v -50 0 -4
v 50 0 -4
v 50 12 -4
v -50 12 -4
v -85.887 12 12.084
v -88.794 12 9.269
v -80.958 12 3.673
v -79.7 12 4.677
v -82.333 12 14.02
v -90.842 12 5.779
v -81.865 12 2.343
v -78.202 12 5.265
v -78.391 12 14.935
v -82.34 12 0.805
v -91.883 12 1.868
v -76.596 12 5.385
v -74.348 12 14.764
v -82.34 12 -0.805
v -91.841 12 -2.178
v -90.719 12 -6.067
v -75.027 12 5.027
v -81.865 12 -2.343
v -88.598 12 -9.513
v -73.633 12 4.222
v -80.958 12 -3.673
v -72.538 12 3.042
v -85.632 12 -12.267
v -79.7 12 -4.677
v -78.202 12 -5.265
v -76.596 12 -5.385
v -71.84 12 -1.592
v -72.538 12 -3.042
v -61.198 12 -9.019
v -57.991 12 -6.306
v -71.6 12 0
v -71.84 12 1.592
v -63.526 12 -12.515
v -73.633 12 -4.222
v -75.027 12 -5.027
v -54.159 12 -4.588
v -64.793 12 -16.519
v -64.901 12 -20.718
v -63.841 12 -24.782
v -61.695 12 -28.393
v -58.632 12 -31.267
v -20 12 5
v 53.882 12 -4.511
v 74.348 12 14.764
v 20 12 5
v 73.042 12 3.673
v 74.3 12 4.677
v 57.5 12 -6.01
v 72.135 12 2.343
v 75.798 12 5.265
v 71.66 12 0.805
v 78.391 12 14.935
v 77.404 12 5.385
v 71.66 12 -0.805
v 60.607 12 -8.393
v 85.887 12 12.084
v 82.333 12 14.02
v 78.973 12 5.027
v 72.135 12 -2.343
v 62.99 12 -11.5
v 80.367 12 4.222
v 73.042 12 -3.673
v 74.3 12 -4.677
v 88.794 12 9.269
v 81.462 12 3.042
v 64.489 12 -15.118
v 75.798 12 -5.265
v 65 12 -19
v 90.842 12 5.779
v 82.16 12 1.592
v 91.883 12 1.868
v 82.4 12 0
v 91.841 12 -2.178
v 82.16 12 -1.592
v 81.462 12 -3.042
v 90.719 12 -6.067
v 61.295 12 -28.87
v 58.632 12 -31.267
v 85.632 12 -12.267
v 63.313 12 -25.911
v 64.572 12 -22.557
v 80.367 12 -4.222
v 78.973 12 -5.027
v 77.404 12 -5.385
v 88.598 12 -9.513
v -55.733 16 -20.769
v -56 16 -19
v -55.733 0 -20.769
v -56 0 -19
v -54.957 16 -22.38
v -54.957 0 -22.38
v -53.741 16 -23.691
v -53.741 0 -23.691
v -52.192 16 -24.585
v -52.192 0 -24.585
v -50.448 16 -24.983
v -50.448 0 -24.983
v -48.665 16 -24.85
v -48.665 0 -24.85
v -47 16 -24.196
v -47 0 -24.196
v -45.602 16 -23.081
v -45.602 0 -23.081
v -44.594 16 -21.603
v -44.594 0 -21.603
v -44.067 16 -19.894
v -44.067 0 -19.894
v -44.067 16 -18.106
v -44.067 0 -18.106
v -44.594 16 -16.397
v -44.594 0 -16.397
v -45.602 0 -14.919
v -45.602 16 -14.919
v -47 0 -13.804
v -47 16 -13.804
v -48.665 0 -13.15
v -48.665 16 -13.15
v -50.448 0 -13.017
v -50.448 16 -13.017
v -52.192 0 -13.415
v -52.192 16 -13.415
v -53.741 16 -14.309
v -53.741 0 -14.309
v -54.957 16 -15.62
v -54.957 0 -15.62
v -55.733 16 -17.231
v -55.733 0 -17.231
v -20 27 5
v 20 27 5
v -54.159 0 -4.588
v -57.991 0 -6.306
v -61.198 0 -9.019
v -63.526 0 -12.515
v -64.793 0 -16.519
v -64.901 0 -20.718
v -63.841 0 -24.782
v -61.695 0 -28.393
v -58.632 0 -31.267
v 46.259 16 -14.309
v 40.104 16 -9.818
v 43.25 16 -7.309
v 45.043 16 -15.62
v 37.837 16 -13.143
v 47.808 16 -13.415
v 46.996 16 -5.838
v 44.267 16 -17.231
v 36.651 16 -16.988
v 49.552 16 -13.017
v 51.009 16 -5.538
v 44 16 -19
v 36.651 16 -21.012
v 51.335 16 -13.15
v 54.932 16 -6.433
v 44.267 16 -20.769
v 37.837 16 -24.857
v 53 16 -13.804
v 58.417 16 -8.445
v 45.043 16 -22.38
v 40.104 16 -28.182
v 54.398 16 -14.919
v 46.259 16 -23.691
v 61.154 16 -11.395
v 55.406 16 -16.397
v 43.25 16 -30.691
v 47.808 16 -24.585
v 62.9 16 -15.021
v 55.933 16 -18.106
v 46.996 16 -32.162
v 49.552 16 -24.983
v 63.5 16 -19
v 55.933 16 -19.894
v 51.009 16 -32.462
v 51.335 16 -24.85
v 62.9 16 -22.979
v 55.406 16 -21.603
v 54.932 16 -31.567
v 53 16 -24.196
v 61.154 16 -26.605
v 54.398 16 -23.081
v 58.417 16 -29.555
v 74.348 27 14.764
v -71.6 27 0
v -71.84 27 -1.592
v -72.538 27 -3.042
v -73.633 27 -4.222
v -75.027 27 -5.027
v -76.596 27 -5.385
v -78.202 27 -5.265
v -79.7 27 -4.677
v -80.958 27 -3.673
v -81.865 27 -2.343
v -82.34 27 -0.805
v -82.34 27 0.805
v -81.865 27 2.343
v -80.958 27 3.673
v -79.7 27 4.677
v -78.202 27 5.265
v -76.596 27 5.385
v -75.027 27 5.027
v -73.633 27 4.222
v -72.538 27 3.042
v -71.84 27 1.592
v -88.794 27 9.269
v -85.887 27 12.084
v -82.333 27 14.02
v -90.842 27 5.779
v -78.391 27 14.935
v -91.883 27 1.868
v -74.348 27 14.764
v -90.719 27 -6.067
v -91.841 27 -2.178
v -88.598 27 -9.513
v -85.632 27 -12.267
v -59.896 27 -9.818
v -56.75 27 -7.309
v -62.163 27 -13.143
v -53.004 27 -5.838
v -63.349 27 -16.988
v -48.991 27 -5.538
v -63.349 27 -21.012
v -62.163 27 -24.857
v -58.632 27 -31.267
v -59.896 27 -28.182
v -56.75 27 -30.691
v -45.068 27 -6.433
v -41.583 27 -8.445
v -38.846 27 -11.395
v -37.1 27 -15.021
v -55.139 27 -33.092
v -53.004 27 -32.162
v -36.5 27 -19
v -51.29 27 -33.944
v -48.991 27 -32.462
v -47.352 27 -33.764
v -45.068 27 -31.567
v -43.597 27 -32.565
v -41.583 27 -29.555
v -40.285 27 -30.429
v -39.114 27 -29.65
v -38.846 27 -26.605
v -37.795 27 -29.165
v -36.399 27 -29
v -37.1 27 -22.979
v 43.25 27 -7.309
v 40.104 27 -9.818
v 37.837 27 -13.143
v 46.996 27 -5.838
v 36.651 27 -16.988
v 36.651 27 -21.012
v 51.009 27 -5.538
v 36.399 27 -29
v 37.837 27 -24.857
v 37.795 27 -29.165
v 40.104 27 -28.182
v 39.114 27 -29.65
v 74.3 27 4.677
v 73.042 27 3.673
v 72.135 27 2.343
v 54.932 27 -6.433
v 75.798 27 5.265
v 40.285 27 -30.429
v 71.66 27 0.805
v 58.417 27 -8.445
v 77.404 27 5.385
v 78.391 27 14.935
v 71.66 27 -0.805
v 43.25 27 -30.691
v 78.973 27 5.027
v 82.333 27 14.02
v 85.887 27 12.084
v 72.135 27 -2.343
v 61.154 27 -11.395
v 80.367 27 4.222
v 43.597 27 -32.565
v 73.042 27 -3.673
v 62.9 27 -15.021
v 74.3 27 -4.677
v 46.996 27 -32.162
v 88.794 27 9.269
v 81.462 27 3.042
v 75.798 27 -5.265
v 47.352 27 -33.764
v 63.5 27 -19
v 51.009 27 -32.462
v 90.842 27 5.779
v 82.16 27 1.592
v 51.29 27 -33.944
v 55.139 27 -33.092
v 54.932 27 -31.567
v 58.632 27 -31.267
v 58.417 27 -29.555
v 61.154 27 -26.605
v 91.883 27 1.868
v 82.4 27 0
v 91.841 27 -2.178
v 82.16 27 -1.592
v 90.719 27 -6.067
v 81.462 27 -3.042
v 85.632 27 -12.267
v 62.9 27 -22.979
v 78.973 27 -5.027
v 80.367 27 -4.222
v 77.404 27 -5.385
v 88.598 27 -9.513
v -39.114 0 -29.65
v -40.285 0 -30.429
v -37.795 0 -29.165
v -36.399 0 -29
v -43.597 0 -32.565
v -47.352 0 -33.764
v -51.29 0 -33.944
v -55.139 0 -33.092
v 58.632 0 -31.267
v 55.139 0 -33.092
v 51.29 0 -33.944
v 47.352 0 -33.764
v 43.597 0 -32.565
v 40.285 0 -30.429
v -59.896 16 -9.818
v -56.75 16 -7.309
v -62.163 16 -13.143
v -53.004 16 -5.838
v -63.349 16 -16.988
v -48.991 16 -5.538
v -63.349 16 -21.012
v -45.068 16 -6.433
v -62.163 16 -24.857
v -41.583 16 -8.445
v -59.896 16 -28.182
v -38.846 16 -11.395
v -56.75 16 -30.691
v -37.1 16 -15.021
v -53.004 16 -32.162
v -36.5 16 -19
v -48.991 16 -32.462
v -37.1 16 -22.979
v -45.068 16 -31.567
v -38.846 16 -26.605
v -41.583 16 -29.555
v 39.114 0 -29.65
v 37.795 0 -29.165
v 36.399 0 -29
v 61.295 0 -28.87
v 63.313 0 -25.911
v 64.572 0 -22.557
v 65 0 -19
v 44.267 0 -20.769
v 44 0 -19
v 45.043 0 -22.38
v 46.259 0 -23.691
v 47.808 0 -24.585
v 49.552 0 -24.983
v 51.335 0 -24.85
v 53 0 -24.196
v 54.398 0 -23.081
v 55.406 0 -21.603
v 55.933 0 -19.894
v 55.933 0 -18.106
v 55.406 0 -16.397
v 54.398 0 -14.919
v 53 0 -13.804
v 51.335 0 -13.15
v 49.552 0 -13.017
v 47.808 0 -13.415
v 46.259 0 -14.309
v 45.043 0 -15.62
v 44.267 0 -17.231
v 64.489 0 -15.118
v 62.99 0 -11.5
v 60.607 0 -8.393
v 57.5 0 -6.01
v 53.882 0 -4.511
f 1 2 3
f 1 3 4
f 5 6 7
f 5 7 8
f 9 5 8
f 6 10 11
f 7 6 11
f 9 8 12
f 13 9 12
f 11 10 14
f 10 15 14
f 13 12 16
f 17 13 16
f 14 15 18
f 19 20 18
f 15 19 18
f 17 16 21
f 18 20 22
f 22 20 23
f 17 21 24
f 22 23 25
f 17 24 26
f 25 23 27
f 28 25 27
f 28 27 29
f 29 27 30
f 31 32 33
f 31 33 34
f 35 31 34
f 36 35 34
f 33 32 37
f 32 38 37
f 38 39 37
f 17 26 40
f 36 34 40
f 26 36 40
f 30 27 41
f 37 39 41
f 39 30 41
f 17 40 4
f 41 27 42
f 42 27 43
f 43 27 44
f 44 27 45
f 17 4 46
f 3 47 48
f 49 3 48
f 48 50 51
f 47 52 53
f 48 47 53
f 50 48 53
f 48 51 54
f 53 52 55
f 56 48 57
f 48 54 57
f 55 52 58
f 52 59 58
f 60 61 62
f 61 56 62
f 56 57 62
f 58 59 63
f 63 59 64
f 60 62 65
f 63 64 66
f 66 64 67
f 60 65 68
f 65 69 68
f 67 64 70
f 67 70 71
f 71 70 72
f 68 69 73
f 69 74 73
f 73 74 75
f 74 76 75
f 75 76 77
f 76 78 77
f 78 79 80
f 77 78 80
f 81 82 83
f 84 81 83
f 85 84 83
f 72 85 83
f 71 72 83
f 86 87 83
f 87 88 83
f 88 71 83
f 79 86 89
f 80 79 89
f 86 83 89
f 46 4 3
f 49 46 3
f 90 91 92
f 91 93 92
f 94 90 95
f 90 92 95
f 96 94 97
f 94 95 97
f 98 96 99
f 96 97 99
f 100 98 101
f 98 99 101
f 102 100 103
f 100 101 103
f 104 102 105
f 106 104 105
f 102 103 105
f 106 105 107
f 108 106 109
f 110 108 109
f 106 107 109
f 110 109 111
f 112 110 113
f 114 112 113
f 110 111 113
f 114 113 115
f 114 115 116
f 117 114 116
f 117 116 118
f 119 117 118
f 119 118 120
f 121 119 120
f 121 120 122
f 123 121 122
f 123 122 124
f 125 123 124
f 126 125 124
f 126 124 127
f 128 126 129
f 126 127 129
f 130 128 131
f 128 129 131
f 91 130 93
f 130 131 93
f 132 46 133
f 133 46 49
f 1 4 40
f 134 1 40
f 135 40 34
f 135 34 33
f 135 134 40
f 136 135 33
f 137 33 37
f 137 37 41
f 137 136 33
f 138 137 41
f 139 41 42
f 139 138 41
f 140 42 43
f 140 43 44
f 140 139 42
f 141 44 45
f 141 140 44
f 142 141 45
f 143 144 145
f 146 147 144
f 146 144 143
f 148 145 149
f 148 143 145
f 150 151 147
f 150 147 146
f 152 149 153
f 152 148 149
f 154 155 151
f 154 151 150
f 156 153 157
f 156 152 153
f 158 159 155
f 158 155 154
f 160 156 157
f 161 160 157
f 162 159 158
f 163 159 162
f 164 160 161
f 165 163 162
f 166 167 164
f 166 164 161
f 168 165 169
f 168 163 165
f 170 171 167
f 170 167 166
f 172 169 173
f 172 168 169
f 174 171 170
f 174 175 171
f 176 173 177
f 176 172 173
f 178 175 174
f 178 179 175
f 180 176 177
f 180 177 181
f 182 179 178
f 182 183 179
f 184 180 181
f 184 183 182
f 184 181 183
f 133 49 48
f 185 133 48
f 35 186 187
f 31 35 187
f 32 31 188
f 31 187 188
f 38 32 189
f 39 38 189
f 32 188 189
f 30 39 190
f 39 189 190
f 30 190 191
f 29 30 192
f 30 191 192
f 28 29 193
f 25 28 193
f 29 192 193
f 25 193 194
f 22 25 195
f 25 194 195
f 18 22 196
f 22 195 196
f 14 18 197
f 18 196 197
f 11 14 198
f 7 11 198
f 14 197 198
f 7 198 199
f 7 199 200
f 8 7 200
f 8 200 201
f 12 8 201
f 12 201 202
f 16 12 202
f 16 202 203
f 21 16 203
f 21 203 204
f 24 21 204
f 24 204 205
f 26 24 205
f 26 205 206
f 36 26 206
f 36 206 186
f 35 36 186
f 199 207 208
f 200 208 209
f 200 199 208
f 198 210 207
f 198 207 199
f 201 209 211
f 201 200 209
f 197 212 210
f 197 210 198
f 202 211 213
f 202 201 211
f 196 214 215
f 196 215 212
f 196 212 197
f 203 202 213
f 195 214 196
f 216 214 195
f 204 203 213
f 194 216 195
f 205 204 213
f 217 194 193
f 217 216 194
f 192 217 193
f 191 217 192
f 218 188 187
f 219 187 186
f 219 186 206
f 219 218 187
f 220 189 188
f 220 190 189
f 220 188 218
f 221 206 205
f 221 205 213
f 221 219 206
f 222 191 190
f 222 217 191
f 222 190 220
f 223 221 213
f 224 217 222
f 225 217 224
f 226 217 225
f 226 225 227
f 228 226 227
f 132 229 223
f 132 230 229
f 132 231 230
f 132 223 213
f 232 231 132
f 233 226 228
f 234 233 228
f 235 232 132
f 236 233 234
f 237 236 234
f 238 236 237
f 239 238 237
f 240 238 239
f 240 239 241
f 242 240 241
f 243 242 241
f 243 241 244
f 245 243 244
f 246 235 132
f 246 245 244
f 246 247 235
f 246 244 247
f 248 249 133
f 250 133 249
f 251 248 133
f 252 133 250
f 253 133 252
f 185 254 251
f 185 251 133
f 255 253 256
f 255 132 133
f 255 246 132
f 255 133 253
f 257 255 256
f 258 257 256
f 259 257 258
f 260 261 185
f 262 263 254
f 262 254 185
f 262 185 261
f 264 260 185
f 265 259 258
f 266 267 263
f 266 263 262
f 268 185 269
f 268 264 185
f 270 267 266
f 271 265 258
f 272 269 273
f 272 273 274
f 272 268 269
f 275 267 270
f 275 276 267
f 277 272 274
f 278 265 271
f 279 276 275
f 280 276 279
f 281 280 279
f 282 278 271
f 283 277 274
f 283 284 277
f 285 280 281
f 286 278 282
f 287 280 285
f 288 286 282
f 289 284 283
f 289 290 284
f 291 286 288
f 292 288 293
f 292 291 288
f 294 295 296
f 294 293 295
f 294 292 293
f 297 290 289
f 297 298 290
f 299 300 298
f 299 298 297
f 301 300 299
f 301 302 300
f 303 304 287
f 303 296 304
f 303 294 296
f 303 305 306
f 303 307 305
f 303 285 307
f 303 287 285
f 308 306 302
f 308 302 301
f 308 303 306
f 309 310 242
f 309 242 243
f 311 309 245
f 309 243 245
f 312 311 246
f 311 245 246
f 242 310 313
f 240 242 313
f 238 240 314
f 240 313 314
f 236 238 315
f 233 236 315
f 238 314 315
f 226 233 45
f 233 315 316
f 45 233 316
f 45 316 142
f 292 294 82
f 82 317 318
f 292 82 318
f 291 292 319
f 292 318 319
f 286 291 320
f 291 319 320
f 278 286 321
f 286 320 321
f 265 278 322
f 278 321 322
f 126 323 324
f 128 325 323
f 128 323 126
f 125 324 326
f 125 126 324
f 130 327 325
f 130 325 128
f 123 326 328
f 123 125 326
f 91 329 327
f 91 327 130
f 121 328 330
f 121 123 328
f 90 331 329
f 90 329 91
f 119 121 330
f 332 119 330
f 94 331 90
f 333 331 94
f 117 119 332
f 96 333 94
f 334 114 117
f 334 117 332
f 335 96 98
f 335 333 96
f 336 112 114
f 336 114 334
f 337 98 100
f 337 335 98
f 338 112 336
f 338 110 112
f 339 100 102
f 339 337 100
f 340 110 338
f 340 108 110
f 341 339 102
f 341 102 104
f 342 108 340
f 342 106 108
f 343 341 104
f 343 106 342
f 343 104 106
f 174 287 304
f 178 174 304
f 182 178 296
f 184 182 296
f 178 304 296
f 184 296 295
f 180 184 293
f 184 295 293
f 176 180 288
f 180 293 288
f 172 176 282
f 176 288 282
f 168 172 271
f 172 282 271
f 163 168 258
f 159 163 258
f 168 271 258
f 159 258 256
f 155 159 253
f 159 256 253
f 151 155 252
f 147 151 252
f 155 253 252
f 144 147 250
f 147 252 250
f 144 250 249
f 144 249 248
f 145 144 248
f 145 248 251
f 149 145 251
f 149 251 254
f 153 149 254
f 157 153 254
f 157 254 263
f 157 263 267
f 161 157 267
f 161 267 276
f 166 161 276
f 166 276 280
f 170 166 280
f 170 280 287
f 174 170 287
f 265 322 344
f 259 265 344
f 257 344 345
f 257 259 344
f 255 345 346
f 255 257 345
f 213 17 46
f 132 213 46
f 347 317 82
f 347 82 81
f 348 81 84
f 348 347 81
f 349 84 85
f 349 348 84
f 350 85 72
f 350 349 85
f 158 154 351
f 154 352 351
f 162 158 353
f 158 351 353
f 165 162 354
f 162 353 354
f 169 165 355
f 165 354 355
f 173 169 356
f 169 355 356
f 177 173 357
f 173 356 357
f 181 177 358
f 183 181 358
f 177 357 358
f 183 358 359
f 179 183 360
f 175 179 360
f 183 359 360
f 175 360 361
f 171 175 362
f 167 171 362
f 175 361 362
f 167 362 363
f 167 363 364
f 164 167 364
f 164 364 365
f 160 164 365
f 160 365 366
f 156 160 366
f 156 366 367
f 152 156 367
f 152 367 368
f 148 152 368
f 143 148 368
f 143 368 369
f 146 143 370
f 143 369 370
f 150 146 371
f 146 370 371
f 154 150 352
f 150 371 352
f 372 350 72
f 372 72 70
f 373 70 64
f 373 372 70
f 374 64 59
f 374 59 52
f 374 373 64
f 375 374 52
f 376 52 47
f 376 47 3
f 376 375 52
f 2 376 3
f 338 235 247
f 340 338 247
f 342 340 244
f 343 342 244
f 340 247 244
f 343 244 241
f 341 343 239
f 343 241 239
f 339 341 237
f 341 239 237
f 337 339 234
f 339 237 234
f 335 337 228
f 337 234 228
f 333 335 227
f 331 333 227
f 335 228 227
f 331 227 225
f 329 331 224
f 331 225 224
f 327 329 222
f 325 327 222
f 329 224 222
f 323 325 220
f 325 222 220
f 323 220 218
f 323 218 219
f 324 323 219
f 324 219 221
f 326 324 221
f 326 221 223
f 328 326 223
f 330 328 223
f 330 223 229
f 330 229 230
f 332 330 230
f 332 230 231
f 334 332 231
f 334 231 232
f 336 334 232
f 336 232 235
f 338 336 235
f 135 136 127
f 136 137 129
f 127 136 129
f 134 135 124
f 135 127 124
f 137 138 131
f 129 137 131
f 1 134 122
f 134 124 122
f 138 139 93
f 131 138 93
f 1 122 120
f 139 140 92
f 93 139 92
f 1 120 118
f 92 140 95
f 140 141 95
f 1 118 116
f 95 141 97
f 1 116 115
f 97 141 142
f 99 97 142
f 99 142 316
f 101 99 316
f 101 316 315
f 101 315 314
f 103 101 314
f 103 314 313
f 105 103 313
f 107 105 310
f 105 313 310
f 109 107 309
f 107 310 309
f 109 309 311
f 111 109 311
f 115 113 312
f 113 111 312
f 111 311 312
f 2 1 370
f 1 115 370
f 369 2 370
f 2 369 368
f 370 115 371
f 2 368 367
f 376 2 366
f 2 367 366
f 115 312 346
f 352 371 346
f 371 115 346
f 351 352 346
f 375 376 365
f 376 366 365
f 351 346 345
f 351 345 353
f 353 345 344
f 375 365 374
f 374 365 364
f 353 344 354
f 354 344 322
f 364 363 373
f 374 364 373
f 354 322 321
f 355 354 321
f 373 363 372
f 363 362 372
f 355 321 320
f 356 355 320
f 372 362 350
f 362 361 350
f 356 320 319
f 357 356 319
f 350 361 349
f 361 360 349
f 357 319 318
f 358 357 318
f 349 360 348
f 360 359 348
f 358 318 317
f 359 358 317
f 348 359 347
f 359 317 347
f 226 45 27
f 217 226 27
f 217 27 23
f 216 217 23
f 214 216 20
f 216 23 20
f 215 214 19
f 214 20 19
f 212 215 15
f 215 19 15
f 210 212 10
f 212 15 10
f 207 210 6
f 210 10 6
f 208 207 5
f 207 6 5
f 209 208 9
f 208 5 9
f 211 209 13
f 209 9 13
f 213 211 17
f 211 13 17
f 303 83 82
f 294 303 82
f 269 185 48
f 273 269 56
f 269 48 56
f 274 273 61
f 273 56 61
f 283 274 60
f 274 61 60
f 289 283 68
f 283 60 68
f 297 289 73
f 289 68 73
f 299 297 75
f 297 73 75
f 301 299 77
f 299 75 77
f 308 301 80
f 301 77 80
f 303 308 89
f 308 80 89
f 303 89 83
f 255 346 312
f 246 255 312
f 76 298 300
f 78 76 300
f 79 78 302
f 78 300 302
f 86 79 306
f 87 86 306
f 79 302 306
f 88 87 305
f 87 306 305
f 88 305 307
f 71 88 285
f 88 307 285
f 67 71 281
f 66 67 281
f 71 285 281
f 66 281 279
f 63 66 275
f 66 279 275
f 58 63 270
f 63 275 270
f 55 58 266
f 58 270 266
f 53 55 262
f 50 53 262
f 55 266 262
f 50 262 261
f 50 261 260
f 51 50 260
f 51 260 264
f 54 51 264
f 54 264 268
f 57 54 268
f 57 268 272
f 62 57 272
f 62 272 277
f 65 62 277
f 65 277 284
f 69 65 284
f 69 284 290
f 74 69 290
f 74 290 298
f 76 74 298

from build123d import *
from build123d.topology import SkipClean

# Parameters (mm, degrees)
BOSS_EXTRU_1_DEPTH      = 27
ESQUISSE1_3_R           = 15
ENL_V_MAT_EXTRU_1_DEPTH = 12
TROU_TARAUD_M12X1_251_D = 10.8
PER_AGE1_D              = 12
PER_AGE1_DEPTH          = 27
PER_AGE1_CBORE_D        = 27
PER_AGE1_CBORE_DEPTH    = 11
PER_AGE1_TIP            = 3.605163714
CONG_1_R                = 6


with BuildPart() as part:
    # Esquisse1 → Boss.-Extru.1 (new body)
    with BuildSketch(Plane(origin=(0, 0, 0), x_dir=(1, 0, 0), z_dir=(0, 1, 0))):
        with BuildLine():
            Line((-74.347688243, -14.763645971), (-20, -5))
            Line((-20, -5), (20, -5))
            Line((20, -5), (74.347688243, -14.763645971))
            ThreePointArc((74.347688243, -14.763645971), (90.842168324, -5.778786733), (85.632401093, 12.26709629))
            Line((85.632401093, 12.26709629), (58.632401093, 31.26709629))
            ThreePointArc((58.632401093, 31.26709629), (48.294734794, 33.902753792), (38.819660113, 29))
            Line((38.819660113, 29), (-38.819660113, 29))
            ThreePointArc((-38.819660113, 29), (-48.294734794, 33.902753792), (-58.632401093, 31.26709629))
            Line((-58.632401093, 31.26709629), (-85.632401093, 12.26709629))
            ThreePointArc((-85.632401093, 12.26709629), (-90.842168324, -5.778786733), (-74.347688243, -14.763645971))
        make_face()
    extrude(amount=BOSS_EXTRU_1_DEPTH)

    # Esquisse1_3 → Enl_v. mat.-Extru.1 (cut)
    with SkipClean():  # keep this step's faces unmerged: merging them makes the solid invalid here
        with BuildSketch(Plane(origin=(0, 0, 0), x_dir=(1, 0, 0), z_dir=(0, 1, 0))):
            with BuildLine():
                Line((-74.347688243, -14.763645971), (-20, -5))
                Line((-20, -5), (0, -5))
                Line((0, -5), (20, -5))
                Line((20, -5), (74.347688243, -14.763645971))
                ThreePointArc((74.347688243, -14.763645971), (63.157831676, 5.778786733), (85.632401093, 12.26709629))
                Line((85.632401093, 12.26709629), (58.632401093, 31.26709629))
                ThreePointArc((58.632401093, 31.26709629), (63.31326437, 25.910643371), (65, 19))
                ThreePointArc((65, 19), (60.606601718, 8.393398282), (50, 4))
                Line((50, 4), (-50, 4))
                ThreePointArc((-50, 4), (-64.300462306, 14.472663274), (-58.632401093, 31.26709629))
                Line((-58.632401093, 31.26709629), (-85.632401093, 12.26709629))
                ThreePointArc((-85.632401093, 12.26709629), (-70.089356629, 13.31326437), (-62, 0))
                ThreePointArc((-62, 0), (-65.493813048, -9.623287475), (-74.347688243, -14.763645971))
            make_face()
            with Locations((77, 0)):
                Circle(ESQUISSE1_3_R)
            with Locations((-77, 0)):
                Circle(ESQUISSE1_3_R)
        extrude(amount=ENL_V_MAT_EXTRU_1_DEPTH, mode=Mode.SUBTRACT)

    # Trou taraud_ M12x1.251 (through all)
    with Locations(Plane(origin=(0, 12, 0), x_dir=(-1, 0, 0), z_dir=(0, -1, 0))):
        with Locations((-77, 0), (77, 0)):
            Hole(TROU_TARAUD_M12X1_251_D / 2)

    # Per_age1
    with Locations(Plane(origin=(0, 27, 0), x_dir=(1, 0, 0), z_dir=(0, 1, 0))):
        with Locations((-50, 19), (50, 19)):
            CounterBoreHole(PER_AGE1_D / 2, PER_AGE1_CBORE_D / 2, PER_AGE1_CBORE_DEPTH, depth=PER_AGE1_DEPTH)
            with Locations((0, 0, -(PER_AGE1_DEPTH + PER_AGE1_TIP / 2))):  # 118° drill point
                Cone(0, PER_AGE1_D / 2, PER_AGE1_TIP, mode=Mode.SUBTRACT)

    # Cong_1
    cong_1_edges = [part.edges().sort_by_distance(p)[0] for p in [
        (38.819660113, 13.5, -29),
        (-38.819660113, 13.5, -29),
    ]]
    fillet(cong_1_edges, radius=CONG_1_R)


solid = part.part
